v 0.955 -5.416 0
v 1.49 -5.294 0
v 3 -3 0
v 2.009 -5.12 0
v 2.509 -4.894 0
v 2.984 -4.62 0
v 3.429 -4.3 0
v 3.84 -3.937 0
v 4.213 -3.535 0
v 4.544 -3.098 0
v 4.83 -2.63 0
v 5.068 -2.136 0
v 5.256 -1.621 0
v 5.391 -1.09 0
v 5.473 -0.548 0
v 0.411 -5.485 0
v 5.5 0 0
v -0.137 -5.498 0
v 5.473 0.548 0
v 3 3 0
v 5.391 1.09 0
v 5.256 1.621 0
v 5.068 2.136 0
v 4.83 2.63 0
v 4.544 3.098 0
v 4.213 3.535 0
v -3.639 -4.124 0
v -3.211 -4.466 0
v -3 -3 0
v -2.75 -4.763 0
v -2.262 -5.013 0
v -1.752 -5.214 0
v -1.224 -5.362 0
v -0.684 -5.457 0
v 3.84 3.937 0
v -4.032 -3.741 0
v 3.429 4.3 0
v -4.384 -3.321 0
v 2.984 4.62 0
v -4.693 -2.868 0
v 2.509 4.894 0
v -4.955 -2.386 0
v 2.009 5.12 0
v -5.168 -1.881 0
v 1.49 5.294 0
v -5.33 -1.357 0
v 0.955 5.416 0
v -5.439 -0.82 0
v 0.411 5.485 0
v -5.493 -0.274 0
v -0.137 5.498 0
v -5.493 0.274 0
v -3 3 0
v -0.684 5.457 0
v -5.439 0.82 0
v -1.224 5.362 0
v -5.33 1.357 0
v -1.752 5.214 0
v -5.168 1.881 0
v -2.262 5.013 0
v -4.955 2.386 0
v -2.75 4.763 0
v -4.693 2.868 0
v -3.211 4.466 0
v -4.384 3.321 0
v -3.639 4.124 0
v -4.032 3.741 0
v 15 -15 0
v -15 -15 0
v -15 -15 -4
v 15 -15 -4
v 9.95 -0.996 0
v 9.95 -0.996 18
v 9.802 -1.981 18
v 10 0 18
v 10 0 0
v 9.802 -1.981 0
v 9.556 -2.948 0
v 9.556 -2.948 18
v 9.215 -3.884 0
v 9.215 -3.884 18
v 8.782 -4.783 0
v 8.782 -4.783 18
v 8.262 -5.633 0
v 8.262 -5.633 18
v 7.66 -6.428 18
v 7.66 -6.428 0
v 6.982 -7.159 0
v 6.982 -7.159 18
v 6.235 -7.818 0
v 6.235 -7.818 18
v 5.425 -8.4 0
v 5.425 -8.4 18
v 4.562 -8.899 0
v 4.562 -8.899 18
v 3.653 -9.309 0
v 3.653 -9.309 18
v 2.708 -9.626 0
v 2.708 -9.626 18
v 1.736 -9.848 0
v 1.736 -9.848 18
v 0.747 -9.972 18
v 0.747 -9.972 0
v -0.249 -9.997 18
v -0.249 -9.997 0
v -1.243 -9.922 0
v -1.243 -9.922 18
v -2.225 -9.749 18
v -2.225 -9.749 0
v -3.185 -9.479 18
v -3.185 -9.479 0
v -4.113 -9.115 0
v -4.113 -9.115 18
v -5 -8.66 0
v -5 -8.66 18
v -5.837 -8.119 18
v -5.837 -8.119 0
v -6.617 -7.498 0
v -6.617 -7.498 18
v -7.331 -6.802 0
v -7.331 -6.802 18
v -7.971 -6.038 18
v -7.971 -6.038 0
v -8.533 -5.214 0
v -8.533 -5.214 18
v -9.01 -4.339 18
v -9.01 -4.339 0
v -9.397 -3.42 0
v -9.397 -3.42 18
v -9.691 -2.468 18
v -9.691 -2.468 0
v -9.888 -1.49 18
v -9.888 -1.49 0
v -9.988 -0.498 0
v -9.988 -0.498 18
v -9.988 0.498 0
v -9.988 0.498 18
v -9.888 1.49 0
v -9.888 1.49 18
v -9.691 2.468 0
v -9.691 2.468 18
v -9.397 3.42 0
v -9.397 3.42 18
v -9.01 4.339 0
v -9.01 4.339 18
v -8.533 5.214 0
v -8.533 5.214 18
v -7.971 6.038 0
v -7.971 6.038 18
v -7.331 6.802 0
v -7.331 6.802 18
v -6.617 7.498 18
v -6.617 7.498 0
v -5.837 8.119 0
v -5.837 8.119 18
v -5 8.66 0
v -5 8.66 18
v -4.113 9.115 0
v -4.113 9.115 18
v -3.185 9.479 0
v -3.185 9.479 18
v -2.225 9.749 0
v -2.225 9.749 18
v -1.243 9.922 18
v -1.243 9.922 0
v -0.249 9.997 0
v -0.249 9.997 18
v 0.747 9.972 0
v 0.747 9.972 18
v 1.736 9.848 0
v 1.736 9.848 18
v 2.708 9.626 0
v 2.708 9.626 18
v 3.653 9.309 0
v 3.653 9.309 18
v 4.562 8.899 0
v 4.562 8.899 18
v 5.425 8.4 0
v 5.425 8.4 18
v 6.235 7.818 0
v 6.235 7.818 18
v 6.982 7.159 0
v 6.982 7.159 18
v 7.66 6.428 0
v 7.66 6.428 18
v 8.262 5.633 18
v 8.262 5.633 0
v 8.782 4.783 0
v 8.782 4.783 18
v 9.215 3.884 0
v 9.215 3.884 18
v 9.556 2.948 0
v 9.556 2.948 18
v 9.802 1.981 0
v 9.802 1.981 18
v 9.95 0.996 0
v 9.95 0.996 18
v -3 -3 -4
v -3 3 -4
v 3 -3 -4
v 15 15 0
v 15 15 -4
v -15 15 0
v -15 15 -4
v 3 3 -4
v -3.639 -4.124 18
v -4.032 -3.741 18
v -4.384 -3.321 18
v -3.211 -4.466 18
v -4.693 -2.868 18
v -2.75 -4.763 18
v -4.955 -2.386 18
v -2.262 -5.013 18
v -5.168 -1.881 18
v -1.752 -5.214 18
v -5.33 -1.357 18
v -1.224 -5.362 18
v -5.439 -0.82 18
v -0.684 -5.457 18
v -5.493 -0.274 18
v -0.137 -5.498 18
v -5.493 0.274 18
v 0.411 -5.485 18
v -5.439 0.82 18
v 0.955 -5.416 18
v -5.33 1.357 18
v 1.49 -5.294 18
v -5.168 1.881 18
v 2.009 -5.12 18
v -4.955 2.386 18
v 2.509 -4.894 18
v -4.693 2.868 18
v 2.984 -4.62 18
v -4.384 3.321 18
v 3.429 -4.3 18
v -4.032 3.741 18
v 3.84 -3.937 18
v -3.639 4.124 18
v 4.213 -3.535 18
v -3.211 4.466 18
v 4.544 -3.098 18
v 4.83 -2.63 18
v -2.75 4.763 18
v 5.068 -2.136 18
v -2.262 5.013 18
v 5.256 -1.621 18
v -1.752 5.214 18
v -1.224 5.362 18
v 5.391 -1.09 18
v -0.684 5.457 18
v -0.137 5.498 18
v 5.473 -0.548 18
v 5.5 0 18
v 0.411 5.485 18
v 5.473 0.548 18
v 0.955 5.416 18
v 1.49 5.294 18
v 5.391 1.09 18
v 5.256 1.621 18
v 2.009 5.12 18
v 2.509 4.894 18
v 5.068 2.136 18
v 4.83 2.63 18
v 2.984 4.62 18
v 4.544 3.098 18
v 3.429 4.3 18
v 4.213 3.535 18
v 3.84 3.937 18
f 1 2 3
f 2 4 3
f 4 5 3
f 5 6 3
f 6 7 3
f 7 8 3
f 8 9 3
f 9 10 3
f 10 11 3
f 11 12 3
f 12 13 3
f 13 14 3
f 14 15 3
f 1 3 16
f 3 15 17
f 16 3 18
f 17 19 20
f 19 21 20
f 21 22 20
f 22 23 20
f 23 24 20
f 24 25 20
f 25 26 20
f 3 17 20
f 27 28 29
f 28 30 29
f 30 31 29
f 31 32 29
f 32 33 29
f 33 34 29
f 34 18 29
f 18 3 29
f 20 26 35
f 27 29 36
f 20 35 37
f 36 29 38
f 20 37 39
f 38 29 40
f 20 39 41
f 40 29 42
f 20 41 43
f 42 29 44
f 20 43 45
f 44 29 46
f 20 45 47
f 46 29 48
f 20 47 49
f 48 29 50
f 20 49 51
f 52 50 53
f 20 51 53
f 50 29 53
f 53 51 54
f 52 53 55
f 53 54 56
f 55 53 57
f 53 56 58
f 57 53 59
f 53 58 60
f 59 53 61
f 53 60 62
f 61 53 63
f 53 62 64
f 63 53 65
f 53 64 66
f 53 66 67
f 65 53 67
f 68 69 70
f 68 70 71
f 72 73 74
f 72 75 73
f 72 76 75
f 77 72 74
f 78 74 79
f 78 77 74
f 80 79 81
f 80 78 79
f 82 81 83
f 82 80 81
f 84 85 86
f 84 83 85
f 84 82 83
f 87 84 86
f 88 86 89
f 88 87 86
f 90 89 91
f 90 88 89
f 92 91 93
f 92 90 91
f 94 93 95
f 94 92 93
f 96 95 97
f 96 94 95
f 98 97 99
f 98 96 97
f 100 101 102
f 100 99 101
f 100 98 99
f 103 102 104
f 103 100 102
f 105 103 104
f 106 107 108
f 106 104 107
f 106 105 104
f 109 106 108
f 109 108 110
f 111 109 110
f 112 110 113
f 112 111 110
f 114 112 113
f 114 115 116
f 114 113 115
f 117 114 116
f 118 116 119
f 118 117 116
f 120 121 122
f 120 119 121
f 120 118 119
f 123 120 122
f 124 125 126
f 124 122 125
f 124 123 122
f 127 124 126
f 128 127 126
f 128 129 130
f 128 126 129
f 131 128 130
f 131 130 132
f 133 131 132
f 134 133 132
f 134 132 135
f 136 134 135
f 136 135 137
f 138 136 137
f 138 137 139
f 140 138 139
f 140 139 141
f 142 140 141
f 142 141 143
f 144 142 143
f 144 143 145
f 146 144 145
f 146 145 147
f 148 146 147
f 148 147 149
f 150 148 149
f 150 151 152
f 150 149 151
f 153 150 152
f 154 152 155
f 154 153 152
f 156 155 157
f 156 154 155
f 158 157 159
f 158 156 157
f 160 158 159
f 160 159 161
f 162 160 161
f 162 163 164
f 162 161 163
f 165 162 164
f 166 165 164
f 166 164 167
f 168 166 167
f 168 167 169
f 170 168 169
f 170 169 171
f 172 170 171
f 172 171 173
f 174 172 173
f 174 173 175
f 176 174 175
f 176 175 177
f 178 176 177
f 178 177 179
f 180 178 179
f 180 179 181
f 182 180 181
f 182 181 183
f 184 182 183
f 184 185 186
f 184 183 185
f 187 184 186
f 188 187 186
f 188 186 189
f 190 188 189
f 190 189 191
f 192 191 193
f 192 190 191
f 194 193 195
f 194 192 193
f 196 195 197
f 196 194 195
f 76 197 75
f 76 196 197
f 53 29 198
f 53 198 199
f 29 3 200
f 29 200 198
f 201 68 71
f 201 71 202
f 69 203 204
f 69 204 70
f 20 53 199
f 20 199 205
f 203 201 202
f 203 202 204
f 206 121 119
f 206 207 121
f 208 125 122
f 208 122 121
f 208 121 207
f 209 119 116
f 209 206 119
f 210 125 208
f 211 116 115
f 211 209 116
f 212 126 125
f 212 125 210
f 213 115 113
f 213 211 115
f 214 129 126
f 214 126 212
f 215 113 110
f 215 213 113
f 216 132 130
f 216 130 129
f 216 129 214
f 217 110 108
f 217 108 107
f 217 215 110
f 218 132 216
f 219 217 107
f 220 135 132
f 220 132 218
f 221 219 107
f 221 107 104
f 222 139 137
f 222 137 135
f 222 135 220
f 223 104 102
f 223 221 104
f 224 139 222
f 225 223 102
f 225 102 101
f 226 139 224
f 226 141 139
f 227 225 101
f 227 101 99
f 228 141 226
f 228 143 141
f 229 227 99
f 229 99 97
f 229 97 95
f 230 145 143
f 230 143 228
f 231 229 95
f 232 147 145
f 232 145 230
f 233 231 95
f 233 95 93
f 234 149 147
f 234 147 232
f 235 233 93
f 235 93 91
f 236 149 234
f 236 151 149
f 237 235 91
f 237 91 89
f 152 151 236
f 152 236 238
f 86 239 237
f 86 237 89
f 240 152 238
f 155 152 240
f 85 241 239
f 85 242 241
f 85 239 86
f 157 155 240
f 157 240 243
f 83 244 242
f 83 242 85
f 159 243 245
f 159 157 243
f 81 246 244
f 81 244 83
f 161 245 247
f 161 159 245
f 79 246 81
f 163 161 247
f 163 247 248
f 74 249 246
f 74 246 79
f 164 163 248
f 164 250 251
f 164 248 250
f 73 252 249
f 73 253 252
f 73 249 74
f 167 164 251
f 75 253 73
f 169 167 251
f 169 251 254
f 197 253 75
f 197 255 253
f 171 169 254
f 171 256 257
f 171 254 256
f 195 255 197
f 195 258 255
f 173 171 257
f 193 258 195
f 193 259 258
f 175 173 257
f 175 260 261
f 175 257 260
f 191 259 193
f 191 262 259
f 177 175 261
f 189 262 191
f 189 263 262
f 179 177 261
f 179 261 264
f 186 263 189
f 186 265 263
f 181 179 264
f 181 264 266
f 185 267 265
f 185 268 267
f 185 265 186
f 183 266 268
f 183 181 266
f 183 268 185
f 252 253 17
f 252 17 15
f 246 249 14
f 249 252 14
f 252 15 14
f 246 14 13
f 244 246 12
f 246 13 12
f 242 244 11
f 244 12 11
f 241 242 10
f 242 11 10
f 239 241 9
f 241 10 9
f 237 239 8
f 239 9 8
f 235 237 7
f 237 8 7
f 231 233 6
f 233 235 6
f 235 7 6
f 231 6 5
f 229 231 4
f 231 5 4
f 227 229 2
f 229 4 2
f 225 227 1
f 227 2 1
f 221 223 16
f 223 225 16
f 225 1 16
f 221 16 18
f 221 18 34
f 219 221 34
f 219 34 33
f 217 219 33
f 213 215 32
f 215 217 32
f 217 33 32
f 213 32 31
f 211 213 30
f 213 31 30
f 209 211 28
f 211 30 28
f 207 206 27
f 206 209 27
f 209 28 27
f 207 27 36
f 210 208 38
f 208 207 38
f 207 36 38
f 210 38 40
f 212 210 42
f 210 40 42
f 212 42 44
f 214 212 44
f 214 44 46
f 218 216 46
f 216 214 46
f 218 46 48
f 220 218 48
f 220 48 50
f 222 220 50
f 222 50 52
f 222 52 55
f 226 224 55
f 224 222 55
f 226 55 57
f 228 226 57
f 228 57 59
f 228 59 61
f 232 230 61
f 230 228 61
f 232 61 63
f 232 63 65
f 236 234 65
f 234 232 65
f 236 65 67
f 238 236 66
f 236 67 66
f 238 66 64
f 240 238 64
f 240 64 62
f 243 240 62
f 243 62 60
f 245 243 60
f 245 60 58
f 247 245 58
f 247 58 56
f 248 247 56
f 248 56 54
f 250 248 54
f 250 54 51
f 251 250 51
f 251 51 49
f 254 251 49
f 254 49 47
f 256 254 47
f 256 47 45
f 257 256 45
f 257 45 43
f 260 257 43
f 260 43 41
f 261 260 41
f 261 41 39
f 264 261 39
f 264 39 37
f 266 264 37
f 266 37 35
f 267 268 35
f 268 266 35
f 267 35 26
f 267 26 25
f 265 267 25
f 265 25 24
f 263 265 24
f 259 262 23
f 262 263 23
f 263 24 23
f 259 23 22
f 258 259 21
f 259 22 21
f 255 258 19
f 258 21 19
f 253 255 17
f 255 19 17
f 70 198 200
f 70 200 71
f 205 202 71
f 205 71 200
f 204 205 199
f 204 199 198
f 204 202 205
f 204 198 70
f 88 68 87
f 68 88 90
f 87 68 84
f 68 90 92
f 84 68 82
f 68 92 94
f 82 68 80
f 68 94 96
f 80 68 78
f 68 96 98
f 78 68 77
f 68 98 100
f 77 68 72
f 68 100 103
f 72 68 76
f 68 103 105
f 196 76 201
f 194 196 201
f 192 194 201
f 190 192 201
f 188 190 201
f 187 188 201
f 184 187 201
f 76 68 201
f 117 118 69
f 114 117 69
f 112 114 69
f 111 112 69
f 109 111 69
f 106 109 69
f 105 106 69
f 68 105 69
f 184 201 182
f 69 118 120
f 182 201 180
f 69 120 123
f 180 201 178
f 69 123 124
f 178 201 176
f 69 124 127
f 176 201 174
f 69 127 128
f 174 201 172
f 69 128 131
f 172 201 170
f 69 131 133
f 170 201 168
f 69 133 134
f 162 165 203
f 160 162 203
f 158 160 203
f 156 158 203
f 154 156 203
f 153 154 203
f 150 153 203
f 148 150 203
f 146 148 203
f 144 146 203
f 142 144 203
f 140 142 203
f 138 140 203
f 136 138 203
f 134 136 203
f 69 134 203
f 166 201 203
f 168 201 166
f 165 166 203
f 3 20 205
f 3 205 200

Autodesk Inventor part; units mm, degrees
ref_plane "YZ Plane" through (0, 0, 0) normal (1, 0, 0) x (0, 1, 0)
ref_plane "XZ Plane" through (0, 0, 0) normal (0, 1, 0) x (-1, 0, 0)
ref_plane "XY Plane" through (0, 0, 0) normal (0, 0, 1) x (1, 0, 0)
sketch "Sketch1" plane through (0, 0, 0) normal (0, 0, 1) x (1, 0, 0)
  circle A0 centre (0, 0) radius 5.5
  circle A1 centre (0, 0) radius 10
  dimension "d0" = 11
  dimension "d1" = 20
extrude "Extrusion1" add sketch "Sketch1" along normal blind 18
sketch "Sketch3" plane through (0, 0, 0) normal (0, 0, -1) x (-1, 0, 0)
  line L0 (15, -15) -> (-15, -15)
  line L1 (-15, -15) -> (-15, 15)
  line L2 (-15, 15) -> (15, 15)
  line L3 (15, 15) -> (15, -15)
  line L4 (15, -15) -> (-15, 15) construction
  line L5 (-15, -15) -> (15, 15) construction
  point P0 (0, 0)
  dimension "d4" = 30
  dimension "d5" = 30
extrude "Extrusion2" add sketch "Sketch3" along normal blind 4
sketch "Sketch5" plane through (0, 0, 0) normal (0, 0, 1) x (1, 0, 0)
  line L0 (-3, 3) -> (3, 3)
  line L1 (3, 3) -> (3, -3)
  line L2 (3, -3) -> (-3, -3)
  line L3 (-3, -3) -> (-3, 3)
  line L4 (-3, 3) -> (3, -3) construction
  line L5 (3, 3) -> (-3, -3) construction
  point P0 (0, 0)
  dimension "d8" = 6
  dimension "d9" = 6
extrude "Extrusion3" cut sketch "Sketch5" against normal blind 10
sketch "Sketch6" plane through (0, 0, 18) normal (0, 0, 1) x (1, 0, 0)
  circle A0 centre (0, 0) radius 10 projected
  line L0 (-10, 0) -> (-5.5, 0) construction
  circle A1 centre (0, 0) radius 5.5 projected
  circle A2 centre (-7.75, 0) radius 1.244
properties part number "MotorDemoV1"
